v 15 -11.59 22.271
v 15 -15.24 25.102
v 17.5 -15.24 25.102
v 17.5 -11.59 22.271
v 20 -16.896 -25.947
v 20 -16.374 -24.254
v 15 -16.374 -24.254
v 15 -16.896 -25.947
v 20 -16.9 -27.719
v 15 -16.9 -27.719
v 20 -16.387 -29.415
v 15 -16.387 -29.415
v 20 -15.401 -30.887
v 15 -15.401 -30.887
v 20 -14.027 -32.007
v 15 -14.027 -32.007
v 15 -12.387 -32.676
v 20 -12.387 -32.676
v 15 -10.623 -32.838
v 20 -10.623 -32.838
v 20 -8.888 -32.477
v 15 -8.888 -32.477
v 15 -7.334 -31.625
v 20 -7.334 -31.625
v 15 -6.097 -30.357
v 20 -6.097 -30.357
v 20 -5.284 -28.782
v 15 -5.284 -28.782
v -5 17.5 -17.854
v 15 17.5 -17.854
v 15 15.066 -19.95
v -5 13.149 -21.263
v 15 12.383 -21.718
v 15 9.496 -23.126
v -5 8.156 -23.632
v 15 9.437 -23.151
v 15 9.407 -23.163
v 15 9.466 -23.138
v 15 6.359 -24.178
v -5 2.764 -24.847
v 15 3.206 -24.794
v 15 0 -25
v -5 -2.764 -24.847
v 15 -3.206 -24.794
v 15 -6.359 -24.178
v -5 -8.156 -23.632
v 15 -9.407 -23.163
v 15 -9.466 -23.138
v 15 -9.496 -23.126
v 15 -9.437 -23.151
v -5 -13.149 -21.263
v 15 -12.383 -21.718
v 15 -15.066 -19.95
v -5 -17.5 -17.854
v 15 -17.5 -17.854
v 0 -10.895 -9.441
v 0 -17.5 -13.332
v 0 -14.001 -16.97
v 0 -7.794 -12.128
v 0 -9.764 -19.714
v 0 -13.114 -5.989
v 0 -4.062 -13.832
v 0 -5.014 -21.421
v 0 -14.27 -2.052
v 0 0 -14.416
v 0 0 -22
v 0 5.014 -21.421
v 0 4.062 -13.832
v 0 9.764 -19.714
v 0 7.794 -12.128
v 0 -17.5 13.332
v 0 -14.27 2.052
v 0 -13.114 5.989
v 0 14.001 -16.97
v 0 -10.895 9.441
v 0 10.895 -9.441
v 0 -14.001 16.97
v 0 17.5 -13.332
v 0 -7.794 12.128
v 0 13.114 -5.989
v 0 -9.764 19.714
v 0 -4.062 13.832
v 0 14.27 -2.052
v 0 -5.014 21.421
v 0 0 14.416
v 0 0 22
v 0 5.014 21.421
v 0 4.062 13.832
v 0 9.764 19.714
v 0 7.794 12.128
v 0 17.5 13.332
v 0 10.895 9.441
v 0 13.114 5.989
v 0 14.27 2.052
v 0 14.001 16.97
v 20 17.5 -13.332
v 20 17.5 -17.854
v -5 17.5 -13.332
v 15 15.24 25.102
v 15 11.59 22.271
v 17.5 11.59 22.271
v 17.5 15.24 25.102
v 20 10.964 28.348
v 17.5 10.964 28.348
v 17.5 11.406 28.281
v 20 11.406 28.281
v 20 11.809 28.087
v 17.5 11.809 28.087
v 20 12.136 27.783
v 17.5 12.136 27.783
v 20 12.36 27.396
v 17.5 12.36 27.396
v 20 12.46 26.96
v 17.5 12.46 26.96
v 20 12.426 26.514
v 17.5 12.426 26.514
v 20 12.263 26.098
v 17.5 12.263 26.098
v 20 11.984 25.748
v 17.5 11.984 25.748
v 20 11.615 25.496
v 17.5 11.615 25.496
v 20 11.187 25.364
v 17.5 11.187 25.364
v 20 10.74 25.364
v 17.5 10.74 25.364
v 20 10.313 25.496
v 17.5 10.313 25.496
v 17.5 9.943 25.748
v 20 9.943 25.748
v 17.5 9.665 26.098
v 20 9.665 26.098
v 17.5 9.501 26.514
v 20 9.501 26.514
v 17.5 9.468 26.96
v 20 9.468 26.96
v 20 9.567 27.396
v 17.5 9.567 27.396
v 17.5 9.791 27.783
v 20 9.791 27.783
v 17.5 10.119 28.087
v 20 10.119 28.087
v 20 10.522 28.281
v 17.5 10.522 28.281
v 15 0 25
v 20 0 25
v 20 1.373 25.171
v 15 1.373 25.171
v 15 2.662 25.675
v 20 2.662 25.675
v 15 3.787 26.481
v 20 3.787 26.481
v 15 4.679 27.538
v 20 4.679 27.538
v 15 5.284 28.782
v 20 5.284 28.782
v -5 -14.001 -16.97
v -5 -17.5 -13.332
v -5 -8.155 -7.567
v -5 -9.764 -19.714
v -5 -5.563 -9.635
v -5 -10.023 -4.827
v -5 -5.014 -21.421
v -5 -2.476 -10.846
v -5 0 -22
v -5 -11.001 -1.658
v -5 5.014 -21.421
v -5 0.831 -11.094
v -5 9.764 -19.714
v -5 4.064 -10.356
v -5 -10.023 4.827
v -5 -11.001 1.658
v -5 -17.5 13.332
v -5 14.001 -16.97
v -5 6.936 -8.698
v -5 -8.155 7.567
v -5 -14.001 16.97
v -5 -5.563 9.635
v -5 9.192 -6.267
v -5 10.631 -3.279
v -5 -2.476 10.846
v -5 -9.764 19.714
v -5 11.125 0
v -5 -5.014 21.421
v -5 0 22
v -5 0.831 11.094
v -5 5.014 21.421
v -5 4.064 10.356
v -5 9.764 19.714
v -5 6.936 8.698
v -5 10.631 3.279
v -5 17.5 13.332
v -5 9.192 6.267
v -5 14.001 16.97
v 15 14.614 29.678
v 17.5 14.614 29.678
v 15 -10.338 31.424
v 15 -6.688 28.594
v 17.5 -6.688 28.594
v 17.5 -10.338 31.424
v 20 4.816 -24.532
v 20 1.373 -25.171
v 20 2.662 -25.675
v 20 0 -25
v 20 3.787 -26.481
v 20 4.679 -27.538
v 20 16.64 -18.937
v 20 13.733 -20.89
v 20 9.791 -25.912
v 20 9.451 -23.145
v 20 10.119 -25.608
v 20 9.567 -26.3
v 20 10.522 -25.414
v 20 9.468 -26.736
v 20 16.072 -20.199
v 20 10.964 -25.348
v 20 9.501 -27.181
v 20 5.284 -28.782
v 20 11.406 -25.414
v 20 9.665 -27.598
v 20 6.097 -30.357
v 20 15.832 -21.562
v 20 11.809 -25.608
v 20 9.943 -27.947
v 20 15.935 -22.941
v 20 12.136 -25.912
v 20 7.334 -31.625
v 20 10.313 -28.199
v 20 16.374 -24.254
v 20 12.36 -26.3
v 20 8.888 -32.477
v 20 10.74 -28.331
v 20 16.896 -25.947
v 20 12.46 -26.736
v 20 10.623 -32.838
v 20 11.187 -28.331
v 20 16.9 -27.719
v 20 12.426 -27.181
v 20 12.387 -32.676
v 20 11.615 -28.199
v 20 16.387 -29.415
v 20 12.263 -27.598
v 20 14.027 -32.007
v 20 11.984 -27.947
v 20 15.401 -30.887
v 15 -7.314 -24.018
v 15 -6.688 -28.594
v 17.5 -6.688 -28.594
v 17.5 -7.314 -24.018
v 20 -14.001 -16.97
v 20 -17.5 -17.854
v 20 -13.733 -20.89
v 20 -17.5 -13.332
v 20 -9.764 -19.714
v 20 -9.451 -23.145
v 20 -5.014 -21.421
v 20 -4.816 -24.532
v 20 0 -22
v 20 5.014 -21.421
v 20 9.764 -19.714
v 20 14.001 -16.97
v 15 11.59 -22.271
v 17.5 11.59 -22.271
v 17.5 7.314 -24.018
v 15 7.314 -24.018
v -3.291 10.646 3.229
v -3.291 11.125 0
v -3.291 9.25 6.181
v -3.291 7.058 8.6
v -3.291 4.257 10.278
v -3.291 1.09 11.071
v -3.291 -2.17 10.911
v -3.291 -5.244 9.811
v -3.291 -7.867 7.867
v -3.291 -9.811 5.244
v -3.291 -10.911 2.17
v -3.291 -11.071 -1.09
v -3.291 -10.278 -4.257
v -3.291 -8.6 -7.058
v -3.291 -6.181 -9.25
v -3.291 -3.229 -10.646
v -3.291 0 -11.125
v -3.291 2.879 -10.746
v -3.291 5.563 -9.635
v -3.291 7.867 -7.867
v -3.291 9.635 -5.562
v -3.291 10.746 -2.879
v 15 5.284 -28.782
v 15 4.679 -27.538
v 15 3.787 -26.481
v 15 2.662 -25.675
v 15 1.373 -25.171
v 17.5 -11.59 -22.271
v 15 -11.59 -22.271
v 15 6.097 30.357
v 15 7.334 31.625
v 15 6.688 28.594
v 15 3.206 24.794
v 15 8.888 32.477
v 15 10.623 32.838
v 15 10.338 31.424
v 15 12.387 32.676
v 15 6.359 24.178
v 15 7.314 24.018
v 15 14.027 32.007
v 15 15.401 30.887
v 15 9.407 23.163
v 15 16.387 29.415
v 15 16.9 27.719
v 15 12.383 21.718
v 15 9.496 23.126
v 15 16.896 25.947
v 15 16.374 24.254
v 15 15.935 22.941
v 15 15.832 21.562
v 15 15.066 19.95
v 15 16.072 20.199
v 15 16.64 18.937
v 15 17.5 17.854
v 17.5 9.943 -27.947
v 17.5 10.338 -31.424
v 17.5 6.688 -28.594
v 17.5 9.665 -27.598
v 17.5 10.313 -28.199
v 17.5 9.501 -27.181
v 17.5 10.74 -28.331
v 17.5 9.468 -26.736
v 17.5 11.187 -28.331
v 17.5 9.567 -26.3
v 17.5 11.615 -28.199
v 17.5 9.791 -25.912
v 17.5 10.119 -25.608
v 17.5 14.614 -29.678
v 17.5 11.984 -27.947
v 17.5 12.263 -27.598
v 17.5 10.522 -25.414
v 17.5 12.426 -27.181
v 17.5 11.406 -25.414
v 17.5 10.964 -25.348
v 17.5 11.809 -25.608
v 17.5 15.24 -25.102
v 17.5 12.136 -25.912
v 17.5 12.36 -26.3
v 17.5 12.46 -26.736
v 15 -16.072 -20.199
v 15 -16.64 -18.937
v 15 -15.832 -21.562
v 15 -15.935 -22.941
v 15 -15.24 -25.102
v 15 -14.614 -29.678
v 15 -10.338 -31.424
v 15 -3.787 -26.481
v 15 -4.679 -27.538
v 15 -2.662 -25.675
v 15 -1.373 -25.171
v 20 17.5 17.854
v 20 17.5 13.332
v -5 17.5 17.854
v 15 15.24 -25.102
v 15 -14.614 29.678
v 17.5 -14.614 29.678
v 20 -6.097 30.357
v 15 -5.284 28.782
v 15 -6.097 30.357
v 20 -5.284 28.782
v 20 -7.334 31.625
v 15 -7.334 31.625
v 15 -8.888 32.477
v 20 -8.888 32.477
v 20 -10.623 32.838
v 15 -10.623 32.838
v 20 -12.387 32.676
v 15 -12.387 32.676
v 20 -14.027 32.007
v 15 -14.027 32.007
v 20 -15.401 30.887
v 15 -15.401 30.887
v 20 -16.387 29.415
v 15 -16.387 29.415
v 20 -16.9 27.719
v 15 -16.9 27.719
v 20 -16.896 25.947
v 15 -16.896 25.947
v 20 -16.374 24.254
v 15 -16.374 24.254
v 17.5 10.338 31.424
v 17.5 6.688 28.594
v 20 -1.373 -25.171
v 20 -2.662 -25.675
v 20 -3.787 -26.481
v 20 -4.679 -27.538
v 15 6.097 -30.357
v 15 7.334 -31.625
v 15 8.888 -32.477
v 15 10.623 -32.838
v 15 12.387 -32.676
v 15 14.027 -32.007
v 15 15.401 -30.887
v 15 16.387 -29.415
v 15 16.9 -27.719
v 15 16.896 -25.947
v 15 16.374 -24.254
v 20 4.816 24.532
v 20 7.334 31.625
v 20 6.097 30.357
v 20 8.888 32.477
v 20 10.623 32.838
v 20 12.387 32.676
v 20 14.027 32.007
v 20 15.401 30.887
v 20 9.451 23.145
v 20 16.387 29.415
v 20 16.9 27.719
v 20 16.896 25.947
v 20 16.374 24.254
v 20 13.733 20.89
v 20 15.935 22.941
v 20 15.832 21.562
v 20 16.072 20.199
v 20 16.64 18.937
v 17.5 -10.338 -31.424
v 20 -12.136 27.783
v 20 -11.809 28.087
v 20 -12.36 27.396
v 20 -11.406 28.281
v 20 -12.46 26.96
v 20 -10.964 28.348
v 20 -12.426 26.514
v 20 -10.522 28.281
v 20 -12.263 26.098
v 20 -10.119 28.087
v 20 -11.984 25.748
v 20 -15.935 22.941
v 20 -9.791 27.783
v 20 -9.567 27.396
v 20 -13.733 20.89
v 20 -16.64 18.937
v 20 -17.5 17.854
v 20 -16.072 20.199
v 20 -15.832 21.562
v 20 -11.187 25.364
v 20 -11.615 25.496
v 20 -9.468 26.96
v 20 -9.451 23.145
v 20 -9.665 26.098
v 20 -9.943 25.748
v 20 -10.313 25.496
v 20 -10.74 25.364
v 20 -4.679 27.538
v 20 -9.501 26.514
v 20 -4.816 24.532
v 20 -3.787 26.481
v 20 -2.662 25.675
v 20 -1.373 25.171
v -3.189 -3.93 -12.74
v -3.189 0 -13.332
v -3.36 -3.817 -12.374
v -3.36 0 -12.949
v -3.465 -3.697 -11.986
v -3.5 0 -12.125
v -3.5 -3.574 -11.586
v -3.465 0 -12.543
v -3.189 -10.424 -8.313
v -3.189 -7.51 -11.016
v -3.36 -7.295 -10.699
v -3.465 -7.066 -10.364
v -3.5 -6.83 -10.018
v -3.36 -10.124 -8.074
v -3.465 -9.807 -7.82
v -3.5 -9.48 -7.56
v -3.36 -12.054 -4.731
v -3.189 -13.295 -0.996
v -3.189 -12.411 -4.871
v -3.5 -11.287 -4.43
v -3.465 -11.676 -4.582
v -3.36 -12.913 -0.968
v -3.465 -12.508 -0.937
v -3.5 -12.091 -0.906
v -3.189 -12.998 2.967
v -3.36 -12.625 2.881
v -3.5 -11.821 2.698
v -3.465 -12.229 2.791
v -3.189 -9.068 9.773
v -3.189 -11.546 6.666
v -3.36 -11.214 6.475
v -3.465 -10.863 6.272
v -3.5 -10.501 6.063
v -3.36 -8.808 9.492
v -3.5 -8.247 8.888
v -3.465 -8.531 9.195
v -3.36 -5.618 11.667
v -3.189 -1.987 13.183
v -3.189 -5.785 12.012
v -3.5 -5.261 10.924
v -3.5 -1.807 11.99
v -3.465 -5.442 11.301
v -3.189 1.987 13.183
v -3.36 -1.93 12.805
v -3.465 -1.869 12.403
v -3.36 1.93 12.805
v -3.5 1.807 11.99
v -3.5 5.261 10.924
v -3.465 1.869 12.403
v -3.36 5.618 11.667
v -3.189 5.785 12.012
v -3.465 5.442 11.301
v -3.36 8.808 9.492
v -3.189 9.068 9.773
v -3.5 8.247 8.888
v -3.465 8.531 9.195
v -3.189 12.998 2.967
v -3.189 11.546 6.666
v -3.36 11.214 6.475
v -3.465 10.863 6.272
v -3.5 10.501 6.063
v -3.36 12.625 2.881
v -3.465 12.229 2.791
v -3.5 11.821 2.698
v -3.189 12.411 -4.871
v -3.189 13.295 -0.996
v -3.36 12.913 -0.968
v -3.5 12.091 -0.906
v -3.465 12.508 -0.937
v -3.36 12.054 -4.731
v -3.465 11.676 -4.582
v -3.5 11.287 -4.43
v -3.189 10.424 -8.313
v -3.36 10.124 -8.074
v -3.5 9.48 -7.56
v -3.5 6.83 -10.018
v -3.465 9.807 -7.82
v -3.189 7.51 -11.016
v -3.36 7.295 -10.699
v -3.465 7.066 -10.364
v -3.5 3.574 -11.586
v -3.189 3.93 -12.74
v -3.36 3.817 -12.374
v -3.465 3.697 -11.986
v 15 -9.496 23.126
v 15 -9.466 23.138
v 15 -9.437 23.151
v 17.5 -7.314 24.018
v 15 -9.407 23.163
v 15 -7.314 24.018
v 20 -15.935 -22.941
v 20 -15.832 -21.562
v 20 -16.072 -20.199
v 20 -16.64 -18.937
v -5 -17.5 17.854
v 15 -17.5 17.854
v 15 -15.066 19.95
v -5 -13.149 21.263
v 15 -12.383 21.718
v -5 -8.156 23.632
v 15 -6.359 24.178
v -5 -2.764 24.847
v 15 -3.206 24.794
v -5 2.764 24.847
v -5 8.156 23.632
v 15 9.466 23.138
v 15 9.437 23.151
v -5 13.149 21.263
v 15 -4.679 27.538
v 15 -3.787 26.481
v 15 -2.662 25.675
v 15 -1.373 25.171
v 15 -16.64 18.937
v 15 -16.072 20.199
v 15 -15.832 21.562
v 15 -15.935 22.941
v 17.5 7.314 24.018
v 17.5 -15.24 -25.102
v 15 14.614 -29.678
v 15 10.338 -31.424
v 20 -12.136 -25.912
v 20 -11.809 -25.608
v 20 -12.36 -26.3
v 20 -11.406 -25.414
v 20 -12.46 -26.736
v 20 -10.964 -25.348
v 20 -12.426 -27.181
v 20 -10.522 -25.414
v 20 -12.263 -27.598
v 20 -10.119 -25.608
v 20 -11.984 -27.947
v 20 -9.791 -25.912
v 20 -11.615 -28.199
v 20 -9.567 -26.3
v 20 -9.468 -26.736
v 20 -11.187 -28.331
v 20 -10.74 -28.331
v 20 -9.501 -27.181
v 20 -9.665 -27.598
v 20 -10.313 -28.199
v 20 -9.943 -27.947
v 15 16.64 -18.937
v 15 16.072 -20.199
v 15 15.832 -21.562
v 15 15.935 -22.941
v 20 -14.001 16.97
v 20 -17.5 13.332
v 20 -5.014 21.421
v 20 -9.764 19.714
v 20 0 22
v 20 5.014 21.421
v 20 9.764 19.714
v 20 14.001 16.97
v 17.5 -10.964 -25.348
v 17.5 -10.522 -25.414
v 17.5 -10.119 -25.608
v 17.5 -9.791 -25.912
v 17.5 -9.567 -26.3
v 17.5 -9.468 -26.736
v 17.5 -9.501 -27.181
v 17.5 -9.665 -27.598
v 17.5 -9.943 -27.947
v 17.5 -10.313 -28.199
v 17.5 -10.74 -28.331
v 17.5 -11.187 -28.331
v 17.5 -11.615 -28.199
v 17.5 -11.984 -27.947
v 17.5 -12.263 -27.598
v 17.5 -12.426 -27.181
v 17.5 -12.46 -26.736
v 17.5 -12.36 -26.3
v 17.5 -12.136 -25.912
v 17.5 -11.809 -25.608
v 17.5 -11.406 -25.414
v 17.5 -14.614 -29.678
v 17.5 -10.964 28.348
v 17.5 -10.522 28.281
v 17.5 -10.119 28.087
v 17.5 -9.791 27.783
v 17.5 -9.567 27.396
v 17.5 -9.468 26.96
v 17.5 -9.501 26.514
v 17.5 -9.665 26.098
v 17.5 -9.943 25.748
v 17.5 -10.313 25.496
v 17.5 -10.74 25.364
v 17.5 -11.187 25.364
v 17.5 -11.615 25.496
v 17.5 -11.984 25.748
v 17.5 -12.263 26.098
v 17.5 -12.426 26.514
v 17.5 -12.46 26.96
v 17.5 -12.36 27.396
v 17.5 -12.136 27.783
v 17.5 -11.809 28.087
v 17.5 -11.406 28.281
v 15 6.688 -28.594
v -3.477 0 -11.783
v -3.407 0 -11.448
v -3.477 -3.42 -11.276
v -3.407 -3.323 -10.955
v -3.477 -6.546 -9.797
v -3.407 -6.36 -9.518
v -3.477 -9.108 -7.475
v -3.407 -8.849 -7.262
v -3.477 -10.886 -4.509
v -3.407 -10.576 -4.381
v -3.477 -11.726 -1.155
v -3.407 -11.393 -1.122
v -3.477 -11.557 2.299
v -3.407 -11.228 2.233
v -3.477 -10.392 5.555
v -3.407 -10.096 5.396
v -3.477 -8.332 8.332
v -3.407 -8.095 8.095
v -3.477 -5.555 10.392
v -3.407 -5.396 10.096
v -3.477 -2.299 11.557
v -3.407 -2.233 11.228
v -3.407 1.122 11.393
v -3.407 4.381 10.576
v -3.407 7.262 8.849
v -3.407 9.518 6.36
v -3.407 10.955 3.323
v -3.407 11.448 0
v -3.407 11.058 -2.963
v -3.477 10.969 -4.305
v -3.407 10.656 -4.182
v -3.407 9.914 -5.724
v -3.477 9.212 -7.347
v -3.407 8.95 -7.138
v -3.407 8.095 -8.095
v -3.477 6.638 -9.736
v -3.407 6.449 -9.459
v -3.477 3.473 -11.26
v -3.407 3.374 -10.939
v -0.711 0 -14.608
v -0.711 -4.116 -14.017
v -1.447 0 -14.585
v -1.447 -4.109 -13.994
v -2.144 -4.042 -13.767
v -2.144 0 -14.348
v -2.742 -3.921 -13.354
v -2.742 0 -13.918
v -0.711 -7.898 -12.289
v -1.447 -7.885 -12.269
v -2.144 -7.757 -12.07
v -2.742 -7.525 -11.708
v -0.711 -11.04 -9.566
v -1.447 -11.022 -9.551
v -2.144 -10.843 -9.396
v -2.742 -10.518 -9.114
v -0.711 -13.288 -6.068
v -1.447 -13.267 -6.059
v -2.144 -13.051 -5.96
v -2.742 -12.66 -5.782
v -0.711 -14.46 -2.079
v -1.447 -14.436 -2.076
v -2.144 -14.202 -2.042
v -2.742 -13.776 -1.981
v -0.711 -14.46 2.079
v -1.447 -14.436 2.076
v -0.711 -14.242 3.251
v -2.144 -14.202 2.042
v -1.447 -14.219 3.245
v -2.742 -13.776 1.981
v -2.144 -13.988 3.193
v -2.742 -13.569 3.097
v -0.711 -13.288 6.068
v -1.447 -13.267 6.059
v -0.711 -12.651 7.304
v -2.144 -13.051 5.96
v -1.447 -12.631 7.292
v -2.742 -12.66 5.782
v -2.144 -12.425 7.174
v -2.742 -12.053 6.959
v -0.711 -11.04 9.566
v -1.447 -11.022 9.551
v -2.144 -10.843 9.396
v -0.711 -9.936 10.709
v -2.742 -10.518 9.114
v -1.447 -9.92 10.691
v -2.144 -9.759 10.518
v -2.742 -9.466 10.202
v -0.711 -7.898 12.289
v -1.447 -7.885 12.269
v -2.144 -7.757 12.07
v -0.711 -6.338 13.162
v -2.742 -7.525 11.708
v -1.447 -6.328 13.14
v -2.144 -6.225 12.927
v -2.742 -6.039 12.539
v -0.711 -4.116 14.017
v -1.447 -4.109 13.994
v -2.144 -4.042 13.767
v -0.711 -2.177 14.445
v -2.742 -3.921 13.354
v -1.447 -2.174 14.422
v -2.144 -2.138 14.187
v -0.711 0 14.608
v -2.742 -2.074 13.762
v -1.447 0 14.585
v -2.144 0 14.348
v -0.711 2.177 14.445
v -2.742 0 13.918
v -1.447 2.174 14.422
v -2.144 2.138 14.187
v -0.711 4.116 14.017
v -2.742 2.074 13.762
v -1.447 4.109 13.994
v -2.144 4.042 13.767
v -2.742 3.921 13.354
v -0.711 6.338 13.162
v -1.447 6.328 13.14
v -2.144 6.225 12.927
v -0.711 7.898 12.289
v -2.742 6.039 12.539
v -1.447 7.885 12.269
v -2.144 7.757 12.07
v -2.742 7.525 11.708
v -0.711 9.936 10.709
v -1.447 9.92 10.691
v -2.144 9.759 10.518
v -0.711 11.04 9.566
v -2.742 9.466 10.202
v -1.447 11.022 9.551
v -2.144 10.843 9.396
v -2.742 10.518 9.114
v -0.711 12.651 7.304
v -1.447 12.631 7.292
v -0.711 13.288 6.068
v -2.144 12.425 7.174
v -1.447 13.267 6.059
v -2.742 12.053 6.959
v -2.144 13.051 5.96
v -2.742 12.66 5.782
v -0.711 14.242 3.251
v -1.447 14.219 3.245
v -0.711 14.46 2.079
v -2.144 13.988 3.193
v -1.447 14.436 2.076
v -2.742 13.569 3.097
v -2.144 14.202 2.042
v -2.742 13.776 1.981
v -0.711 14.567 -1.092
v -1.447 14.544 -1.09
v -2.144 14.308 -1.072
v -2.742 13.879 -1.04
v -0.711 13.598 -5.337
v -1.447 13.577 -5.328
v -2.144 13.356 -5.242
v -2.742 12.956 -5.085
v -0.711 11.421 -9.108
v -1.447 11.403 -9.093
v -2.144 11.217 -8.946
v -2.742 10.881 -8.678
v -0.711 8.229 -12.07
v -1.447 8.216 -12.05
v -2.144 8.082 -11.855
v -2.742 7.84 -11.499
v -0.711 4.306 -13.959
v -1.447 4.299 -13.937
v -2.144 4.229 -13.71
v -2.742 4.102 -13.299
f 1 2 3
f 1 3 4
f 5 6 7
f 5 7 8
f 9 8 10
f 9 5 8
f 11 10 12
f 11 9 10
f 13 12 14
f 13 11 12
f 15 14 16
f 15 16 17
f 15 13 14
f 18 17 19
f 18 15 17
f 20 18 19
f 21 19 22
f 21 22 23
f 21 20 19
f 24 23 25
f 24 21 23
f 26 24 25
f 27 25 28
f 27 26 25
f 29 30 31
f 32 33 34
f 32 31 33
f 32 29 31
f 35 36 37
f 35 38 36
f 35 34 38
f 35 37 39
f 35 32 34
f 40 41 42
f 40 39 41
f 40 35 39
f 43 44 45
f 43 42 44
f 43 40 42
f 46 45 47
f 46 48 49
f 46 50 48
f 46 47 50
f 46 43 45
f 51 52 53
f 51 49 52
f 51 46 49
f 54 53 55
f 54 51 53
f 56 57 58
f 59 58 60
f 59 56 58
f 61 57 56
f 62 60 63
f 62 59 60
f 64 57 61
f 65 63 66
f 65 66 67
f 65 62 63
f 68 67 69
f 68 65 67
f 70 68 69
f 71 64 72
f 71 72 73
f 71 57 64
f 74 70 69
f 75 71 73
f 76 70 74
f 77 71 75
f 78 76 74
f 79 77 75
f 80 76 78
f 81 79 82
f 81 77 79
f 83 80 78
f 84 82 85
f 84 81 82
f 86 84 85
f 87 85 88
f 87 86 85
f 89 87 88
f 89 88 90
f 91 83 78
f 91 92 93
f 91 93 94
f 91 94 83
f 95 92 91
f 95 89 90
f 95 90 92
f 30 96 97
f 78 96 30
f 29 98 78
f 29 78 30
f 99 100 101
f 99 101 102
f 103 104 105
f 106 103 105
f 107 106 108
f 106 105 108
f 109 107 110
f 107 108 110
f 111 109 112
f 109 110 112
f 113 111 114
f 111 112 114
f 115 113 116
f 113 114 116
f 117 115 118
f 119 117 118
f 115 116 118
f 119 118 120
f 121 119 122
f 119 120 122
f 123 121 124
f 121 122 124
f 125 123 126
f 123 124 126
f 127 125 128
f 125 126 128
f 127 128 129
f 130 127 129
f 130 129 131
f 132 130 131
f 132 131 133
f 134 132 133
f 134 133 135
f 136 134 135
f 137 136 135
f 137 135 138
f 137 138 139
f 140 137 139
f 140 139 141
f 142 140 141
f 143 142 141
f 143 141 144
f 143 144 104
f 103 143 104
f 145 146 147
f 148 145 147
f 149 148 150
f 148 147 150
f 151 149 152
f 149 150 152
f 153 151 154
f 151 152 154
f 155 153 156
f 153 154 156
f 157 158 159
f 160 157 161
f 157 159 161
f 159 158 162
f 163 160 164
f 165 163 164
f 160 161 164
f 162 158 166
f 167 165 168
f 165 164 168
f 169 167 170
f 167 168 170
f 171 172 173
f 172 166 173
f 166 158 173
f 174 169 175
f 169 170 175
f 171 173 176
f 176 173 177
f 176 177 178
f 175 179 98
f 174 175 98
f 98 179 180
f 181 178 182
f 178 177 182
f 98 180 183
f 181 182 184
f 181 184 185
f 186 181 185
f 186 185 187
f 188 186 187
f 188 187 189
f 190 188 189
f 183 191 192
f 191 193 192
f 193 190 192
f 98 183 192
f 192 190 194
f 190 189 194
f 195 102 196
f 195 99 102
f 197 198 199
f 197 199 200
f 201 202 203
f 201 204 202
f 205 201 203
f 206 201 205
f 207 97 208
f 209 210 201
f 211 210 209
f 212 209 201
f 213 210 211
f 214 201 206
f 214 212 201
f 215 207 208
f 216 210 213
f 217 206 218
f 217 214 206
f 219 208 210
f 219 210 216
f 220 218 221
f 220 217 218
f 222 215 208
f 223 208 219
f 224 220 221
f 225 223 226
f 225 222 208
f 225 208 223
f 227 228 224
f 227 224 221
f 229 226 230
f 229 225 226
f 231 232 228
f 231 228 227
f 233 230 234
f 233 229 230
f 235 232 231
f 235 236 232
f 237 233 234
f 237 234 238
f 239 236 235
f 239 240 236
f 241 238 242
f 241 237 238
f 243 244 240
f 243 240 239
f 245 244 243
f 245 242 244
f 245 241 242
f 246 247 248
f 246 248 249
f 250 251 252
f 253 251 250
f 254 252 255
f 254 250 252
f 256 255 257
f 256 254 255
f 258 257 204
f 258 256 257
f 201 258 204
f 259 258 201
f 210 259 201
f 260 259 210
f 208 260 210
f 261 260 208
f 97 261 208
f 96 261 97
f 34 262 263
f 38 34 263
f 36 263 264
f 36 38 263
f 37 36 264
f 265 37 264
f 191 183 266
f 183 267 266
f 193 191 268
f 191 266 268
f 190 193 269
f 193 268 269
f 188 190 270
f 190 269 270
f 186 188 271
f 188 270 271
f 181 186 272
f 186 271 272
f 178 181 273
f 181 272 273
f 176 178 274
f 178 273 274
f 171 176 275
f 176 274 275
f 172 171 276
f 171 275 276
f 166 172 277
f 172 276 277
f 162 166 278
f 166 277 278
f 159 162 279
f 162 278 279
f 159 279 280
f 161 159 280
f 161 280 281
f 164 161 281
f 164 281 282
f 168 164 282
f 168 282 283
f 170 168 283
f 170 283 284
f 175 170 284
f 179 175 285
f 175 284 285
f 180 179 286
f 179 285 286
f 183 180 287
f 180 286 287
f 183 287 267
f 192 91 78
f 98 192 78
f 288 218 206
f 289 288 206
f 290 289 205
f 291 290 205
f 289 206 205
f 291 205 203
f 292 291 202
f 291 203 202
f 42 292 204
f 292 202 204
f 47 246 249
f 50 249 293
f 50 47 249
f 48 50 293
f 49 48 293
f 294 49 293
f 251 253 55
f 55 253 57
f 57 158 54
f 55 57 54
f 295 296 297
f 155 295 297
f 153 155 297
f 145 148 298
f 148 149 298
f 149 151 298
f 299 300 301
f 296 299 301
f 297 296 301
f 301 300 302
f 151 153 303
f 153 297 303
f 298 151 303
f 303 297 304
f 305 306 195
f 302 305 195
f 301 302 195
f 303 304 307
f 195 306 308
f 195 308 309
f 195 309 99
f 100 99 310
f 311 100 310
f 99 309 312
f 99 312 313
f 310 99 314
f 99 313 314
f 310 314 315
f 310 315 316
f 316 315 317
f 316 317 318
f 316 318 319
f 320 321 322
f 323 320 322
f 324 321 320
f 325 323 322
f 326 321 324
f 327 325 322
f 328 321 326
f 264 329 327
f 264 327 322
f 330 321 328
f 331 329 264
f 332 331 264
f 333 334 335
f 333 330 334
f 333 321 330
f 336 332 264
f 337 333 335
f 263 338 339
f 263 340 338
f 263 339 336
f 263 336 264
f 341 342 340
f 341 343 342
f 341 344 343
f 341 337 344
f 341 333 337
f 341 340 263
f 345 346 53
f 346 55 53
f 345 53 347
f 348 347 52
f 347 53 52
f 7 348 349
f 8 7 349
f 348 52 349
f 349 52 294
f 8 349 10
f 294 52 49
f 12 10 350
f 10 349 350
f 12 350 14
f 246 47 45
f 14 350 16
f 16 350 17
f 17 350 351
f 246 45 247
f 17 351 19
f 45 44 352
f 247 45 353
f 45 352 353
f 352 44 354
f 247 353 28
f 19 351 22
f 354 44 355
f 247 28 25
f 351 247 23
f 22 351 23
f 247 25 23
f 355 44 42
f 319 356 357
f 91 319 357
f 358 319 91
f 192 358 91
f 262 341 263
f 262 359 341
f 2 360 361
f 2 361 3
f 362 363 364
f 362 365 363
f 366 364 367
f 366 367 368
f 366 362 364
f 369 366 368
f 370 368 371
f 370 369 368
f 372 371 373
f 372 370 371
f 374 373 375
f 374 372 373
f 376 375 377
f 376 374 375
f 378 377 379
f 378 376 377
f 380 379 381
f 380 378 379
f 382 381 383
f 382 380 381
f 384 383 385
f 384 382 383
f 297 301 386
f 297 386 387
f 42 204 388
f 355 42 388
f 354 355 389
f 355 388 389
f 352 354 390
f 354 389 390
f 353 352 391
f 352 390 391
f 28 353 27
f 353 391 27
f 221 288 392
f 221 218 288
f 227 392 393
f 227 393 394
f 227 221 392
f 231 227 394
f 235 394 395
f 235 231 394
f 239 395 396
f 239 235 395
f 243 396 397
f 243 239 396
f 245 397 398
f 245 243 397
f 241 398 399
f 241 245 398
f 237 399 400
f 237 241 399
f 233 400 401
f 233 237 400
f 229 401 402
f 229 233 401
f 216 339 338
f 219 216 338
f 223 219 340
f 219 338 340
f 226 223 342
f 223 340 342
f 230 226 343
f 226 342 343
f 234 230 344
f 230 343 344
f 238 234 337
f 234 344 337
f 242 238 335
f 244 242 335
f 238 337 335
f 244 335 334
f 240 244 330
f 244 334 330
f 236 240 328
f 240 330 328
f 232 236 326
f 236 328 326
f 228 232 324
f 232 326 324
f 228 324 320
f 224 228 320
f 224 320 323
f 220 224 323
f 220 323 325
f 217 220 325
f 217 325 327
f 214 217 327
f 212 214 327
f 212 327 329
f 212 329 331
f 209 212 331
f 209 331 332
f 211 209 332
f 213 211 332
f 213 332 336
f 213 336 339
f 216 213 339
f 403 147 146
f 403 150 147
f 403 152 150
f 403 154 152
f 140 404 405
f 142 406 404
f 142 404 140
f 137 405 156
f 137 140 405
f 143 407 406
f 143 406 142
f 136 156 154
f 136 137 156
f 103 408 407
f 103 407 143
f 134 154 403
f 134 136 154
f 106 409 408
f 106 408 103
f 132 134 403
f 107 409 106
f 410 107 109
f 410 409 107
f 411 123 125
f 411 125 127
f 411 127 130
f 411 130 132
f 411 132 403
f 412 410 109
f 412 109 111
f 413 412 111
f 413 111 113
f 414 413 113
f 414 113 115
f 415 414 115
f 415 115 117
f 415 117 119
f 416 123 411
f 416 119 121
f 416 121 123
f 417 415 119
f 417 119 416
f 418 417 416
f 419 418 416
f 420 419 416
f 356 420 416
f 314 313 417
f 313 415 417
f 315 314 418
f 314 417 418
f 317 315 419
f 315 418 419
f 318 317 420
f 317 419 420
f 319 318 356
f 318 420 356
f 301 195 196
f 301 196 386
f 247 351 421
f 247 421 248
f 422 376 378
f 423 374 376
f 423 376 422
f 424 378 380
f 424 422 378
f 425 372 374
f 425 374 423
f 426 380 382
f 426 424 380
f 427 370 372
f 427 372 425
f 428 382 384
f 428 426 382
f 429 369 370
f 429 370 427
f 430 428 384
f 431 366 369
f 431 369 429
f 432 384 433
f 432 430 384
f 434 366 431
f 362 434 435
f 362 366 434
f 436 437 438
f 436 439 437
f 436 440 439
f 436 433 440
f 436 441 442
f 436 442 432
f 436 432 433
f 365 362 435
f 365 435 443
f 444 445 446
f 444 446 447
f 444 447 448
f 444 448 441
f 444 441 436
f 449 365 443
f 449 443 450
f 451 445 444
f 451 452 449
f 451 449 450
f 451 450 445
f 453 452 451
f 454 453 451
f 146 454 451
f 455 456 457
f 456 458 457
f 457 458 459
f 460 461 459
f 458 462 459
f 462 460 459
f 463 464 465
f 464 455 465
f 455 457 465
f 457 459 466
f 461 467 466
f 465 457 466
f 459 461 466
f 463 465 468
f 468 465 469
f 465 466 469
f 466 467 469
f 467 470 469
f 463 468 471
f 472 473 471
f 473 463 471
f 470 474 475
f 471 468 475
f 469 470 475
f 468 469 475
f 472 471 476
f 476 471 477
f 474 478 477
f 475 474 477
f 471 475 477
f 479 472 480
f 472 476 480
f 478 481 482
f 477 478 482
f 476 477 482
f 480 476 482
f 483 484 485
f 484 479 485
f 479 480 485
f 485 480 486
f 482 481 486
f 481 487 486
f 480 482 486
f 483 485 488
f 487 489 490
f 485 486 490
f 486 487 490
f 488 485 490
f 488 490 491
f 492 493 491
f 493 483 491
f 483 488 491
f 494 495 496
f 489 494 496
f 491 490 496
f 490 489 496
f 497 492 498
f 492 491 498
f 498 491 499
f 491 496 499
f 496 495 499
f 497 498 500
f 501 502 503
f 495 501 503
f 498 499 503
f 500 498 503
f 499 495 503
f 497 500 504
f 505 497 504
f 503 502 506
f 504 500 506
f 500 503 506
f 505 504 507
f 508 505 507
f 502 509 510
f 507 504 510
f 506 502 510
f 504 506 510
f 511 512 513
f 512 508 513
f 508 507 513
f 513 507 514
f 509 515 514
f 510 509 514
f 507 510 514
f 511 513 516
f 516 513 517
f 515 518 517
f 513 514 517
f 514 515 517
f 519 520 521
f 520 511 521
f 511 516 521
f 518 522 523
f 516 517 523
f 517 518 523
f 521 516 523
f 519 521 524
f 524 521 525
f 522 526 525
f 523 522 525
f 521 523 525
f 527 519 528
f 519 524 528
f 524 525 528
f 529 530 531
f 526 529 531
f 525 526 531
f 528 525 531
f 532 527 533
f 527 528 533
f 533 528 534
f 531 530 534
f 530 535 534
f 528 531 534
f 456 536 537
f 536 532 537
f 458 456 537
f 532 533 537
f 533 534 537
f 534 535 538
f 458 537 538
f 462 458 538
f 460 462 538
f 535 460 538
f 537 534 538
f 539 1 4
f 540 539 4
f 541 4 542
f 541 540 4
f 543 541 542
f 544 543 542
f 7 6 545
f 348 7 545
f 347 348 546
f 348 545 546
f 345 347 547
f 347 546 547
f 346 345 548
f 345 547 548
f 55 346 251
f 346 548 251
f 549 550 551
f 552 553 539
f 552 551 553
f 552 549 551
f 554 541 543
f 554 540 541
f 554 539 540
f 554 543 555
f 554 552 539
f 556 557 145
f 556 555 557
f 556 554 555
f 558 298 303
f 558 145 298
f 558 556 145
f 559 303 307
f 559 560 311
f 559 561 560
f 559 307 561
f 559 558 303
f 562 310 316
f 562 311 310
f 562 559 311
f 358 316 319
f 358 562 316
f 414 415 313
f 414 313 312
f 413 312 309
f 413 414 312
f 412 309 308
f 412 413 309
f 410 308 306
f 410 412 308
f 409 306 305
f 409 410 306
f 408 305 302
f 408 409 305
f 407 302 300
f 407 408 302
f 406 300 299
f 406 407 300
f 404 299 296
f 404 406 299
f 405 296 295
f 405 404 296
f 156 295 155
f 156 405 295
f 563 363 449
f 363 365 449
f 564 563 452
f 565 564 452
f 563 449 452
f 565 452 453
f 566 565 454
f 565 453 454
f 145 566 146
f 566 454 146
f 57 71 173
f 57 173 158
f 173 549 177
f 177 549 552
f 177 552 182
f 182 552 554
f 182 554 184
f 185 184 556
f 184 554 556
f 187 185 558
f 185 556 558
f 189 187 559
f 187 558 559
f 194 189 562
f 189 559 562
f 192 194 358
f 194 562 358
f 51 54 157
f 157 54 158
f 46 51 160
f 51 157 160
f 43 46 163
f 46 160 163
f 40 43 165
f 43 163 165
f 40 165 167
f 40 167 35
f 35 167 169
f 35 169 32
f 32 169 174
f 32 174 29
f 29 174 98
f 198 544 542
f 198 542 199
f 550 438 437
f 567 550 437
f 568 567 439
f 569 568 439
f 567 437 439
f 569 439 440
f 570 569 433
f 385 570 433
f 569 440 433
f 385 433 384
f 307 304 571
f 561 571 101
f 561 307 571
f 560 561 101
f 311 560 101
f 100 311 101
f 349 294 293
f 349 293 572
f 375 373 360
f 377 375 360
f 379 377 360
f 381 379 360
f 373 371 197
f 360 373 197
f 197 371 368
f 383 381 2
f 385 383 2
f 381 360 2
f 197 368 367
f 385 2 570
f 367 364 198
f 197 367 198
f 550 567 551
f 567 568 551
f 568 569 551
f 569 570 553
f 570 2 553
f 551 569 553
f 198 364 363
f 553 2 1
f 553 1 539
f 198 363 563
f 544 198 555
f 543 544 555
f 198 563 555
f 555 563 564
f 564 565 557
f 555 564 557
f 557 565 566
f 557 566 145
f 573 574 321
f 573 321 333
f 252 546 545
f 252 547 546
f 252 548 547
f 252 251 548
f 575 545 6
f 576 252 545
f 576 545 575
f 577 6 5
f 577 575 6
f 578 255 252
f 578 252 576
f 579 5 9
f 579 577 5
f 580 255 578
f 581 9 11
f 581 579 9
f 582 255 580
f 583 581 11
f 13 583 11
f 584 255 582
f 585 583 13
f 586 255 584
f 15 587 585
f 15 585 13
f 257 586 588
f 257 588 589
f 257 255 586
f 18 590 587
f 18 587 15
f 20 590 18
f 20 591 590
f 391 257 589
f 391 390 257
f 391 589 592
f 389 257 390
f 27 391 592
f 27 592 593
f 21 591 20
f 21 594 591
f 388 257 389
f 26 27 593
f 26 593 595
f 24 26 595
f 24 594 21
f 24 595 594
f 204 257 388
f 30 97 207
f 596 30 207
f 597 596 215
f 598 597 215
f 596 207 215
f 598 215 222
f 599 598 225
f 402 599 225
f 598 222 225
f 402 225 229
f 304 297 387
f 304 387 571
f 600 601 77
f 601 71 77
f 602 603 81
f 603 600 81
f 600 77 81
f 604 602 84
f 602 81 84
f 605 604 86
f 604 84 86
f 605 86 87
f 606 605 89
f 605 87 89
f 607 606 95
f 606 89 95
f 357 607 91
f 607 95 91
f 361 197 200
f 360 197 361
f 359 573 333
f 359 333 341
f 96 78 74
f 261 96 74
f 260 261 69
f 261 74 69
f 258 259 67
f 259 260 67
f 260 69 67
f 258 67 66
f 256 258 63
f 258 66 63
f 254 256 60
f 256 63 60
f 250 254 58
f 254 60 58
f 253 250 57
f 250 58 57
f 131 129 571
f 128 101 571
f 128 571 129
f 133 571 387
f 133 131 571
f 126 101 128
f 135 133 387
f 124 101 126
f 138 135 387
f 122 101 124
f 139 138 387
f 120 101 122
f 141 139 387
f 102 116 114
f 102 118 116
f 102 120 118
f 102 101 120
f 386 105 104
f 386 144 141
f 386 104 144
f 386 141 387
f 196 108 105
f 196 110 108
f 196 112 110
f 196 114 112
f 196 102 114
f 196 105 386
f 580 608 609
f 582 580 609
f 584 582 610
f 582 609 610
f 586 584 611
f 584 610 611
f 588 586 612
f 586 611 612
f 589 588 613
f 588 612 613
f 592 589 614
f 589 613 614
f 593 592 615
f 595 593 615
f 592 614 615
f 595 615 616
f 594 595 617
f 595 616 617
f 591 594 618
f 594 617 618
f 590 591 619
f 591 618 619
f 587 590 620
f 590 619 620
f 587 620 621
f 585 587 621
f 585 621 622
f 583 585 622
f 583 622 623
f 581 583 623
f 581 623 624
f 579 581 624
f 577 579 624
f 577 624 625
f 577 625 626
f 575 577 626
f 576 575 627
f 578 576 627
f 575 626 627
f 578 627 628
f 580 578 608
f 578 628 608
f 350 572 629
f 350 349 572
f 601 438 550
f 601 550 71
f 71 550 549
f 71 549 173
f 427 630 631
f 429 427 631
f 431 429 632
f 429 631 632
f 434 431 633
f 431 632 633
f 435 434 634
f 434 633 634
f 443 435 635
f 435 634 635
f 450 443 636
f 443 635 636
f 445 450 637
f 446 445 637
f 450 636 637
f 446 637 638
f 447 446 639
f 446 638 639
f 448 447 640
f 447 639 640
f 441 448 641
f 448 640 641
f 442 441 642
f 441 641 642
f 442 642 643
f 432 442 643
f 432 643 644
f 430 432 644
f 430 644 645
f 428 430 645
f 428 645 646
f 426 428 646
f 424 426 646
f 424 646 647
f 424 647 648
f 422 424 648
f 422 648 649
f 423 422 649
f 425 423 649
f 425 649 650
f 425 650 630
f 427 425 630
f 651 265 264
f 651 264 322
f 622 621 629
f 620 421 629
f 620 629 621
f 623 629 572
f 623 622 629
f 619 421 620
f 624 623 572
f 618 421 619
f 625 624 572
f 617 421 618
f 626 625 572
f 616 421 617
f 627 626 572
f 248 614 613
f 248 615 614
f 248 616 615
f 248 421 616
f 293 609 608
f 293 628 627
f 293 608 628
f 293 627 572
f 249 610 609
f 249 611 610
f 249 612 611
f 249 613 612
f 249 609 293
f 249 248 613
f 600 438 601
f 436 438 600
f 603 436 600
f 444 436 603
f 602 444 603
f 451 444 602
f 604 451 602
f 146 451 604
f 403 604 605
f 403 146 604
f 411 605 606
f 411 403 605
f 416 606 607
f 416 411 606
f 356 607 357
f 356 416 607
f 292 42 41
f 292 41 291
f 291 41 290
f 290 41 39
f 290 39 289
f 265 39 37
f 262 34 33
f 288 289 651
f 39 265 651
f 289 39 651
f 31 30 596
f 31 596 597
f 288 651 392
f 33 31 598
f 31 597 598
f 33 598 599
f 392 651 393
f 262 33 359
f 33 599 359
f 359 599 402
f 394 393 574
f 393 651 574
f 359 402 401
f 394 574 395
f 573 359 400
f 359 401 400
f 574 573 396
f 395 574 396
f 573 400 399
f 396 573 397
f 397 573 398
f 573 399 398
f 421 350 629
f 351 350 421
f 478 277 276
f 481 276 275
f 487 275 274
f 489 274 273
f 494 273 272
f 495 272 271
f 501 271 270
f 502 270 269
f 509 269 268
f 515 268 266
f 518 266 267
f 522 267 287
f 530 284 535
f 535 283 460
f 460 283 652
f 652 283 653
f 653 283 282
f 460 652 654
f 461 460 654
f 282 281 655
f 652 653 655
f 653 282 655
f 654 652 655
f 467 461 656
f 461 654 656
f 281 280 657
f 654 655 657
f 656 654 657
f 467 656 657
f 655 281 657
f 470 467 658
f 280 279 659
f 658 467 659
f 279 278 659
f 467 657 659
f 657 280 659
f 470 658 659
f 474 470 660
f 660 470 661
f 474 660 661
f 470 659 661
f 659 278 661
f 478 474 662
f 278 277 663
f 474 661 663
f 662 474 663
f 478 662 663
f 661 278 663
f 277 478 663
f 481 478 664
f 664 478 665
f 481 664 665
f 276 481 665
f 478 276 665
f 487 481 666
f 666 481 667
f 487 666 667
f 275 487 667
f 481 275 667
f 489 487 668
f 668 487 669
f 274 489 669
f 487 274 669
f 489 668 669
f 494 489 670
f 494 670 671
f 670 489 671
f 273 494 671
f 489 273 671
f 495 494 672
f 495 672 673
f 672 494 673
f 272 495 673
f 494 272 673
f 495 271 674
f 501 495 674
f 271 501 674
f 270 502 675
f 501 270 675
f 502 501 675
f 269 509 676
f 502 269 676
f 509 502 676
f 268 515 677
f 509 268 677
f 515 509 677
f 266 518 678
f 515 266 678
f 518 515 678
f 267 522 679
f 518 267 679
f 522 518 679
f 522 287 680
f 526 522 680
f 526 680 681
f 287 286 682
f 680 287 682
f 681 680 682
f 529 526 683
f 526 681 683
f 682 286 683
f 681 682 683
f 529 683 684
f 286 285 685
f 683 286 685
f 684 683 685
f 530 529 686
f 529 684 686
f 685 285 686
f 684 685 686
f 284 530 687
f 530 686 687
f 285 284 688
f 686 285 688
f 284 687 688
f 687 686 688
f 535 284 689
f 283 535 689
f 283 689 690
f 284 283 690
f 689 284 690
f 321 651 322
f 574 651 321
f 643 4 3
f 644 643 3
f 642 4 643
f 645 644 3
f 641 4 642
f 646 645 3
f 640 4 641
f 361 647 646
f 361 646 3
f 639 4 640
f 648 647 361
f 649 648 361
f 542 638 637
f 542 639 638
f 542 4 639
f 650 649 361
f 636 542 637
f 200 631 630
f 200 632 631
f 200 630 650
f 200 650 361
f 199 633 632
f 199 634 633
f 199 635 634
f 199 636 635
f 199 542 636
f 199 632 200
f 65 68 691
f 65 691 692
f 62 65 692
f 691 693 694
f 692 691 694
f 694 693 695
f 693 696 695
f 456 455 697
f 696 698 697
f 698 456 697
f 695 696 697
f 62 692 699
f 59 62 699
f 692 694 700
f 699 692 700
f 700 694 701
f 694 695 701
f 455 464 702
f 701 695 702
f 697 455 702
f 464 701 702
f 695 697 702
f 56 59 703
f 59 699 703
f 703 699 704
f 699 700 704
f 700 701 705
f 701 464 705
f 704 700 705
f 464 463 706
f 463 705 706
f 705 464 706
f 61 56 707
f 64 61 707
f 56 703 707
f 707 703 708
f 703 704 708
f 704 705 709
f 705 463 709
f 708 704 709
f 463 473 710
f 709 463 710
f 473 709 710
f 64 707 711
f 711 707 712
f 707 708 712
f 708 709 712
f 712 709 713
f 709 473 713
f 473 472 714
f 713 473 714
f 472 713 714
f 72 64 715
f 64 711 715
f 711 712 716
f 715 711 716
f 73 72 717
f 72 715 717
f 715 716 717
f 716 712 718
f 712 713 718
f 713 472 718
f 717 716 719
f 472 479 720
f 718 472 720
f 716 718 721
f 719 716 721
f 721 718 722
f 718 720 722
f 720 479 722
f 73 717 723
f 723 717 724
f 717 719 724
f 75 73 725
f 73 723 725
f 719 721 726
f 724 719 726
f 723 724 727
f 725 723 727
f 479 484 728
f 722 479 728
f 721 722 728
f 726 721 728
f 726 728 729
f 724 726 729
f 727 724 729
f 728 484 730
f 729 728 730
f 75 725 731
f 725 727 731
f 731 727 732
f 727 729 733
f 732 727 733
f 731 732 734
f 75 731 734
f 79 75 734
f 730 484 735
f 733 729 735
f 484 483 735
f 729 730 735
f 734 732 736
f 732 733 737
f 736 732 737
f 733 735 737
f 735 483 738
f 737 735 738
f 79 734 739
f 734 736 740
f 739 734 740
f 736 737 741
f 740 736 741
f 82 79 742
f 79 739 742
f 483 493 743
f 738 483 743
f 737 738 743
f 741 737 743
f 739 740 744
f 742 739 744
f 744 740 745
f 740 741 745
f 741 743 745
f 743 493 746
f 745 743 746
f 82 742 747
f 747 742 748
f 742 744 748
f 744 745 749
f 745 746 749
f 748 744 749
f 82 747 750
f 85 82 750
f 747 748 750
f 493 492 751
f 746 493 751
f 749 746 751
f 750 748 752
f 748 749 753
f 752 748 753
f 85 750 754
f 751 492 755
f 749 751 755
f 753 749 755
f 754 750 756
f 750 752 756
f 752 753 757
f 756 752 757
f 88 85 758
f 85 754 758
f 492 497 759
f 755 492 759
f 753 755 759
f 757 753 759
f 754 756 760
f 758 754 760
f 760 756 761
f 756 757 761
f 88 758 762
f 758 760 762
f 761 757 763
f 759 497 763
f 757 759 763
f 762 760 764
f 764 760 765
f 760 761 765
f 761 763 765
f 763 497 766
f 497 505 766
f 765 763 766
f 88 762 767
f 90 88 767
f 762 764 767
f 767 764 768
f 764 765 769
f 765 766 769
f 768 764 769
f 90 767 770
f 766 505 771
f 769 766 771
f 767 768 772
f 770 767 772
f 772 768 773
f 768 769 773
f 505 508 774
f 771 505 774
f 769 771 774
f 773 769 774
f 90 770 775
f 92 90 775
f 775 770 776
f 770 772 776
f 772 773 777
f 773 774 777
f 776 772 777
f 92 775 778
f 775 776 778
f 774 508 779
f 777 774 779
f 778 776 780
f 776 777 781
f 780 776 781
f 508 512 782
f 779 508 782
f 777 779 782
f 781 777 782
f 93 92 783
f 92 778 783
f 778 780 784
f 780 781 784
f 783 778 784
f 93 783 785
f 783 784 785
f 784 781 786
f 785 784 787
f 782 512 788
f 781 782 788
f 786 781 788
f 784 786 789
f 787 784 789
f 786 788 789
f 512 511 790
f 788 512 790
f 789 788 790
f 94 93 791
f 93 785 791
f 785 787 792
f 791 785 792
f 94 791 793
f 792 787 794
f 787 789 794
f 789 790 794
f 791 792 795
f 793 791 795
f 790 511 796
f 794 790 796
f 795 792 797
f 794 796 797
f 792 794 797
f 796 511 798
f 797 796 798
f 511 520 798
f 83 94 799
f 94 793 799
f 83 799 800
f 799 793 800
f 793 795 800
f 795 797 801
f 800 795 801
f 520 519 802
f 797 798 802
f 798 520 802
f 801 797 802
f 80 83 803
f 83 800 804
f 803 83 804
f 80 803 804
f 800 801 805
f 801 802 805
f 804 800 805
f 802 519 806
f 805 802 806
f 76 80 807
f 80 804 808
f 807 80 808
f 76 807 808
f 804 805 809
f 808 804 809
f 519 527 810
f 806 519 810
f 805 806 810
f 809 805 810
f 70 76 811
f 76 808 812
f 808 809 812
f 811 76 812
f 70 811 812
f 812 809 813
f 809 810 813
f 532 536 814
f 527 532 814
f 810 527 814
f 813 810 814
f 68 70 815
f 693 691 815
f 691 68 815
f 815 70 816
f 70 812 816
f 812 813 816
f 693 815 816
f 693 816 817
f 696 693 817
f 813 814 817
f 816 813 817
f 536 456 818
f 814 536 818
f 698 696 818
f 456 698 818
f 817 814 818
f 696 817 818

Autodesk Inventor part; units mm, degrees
ref_plane "YZ Plane" through (0, 0, 0) normal (1, 0, 0) x (0, 1, 0)
ref_plane "XZ Plane" through (0, 0, 0) normal (0, 1, 0) x (-1, 0, 0)
ref_plane "XY Plane" through (0, 0, 0) normal (0, 0, 1) x (1, 0, 0)
sketch "Sketch1" plane through (0, 0, 0) normal (1, 0, 0) x (0, 1, 0)
  circle A0 centre (0, 0) radius 11.125
  line L0 (17.5, 17.8536) -> (17.5, -17.8536)
  line L1 (-17.5, 17.8536) -> (-17.5, -17.8536)
  circle A1 centre (0, 0) radius 25
  circle A2 centre (0, 0) radius 22
  point P0 (-17.5, -13.3323)
  point P1 (17.5, -13.3323)
  point P2 (17.5, 13.3323)
  point P3 (-17.5, 13.3323)
  dimension "d0" = 22.25
  dimension "d1" = 44
  dimension "d2" = 3
  dimension "d3" = 35
  dimension "d4" = 17.5
  dimension "d5" = 17.5
extrude "Extrusion1" add sketch "Sketch1" against normal blind 5 contours L0 A2 L1
sketch "Sketch2" plane through (0, 0, 0) normal (0, 1, 0) x (-1, 0, 0)
  circle A0 centre (1, -12.125) radius 2.5
  line L0 (0, -11.125) -> (0, 11.125) projected
  line L1 (0, -13.3323) -> (5, -13.3323) projected
  line L2 (10.1054, 0) -> (-6.8503, 0) construction
  point P0 (0, 0)
  dimension "d8" = 5
  dimension "d9" = 1
  dimension "d11" = 1
revolve "Revolution1" cut sketch "Sketch2" angle 360 about axis through (-10.1054, 0, 0) along (1, 0, 0)
extrude "Extrusion2" add sketch "Sketch1" along normal blind 20 and the other way blind 5 contours L0 A2 L1 A1 | L0 A1 L1 A2
sketch "Sketch3" plane through (20, 0, 0) normal (1, 0, 0) x (0, 0, -1)
  line L0 (-13.3323, 17.5) -> (-17.8536, 17.5) projected
  arc A0 (-24.2536, 16.374) -> (-17.8536, 17.5) centre (-21.8402, 21.4076) ccw
  arc A1 (-24.2536, 16.374) -> (-28.7823, 5.2842) centre (-26.8477, 10.9637) ccw
  arc A2 (-17.8536, 17.5) -> (-17.8536, -17.5) centre (0, 0) ccw projected
  arc A3 (-25, 0) -> (-28.7823, 5.2842) centre (-30.5823, 0) ccw
  arc A4 (-28.7823, -5.2842) -> (-25, 0) centre (-30.5823, 0) ccw
  arc A5 (-28.7823, -5.2842) -> (-24.2536, -16.374) centre (-26.8477, -10.9637) ccw
  arc A6 (-17.8536, -17.5) -> (-24.2536, -16.374) centre (-21.8402, -21.4076) ccw
  arc A7 (-17.8536, 17.5) -> (-17.8536, -17.5) centre (0, 0) ccw projected
  line L1 (-17.8536, 17.5) -> (17.8536, 17.5) projected
  arc A8 (17.8536, 17.5) -> (24.2536, 16.374) centre (21.8402, 21.4076) ccw
  arc A9 (28.7823, 5.2842) -> (24.2536, 16.374) centre (26.8477, 10.9637) ccw
  arc A10 (28.7823, 5.2842) -> (25, 0) centre (30.5823, 0) ccw
  line L2 (17.8536, -17.5) -> (-17.8536, -17.5) projected
  arc A11 (24.2536, -16.374) -> (17.8536, -17.5) centre (21.8402, -21.4076) ccw
  arc A12 (24.2536, -16.374) -> (28.7823, -5.2842) centre (26.8477, -10.9637) ccw
  arc A13 (25, 0) -> (28.7823, -5.2842) centre (30.5823, 0) ccw
  arc A14 (17.8536, -17.5) -> (17.8536, 17.5) centre (0, 0) ccw projected
  circle A15 centre (-26.8477, -10.9637) radius 4 construction
  circle A16 centre (-26.8477, 10.9637) radius 4 construction
  circle A17 centre (26.8477, 10.9637) radius 4 construction
  circle A18 centre (26.8477, -10.9637) radius 4 construction
  dimension "d17" = 6
  dimension "d18" = 6
  dimension "d19" = 6
  dimension "d20" = 6
  dimension "d21" = 8
  dimension "d22" = 8
  dimension "d23" = 8
  dimension "d24" = 8
extrude "Extrusion3" add sketch "Sketch3" against normal blind 5 contours A2 A3 A1 A0 | A8 A9 A10 A14 | A2 A6 A5 A4 | A13 A12 A11 A14
sketch "Sketch4" plane through (15, 0, 0) normal (-1, 0, 0) x (0, 0, 1)
  line L0 (22.2714, -11.5895) -> (24.0176, -7.3135)
  line L1 (24.0176, -7.3135) -> (28.5938, -6.6877)
  line L2 (28.5938, -6.6877) -> (31.4239, -10.3379)
  line L3 (31.4239, -10.3379) -> (29.6777, -14.6139)
  line L4 (29.6777, -14.6139) -> (25.1015, -15.2397)
  line L5 (25.1015, -15.2397) -> (22.2714, -11.5895)
  line L6 (25.1015, 15.2397) -> (29.6777, 14.6139)
  line L7 (29.6777, 14.6139) -> (31.4239, 10.3379)
  line L8 (31.4239, 10.3379) -> (28.5938, 6.6877)
  line L9 (28.5938, 6.6877) -> (24.0176, 7.3135)
  line L10 (24.0176, 7.3135) -> (22.2714, 11.5895)
  line L11 (22.2714, 11.5895) -> (25.1015, 15.2397)
  line L12 (-25.1015, -15.2397) -> (-29.6777, -14.6139)
  line L13 (-29.6777, -14.6139) -> (-31.4239, -10.3379)
  line L14 (-31.4239, -10.3379) -> (-28.5938, -6.6877)
  line L15 (-28.5938, -6.6877) -> (-24.0176, -7.3135)
  line L16 (-24.0176, -7.3135) -> (-22.2714, -11.5895)
  line L17 (-22.2714, -11.5895) -> (-25.1015, -15.2397)
  line L18 (-29.6777, 14.6139) -> (-25.1015, 15.2397)
  line L19 (-25.1015, 15.2397) -> (-22.2714, 11.5895)
  line L20 (-22.2714, 11.5895) -> (-24.0176, 7.3135)
  line L21 (-24.0176, 7.3135) -> (-28.5938, 6.6877)
  line L22 (-28.5938, 6.6877) -> (-31.4239, 10.3379)
  line L23 (-31.4239, 10.3379) -> (-29.6777, 14.6139)
  arc A0 (17.8536, -17.5) -> (17.8536, 17.5) centre (0, 0) ccw projected
  arc A1 (-17.8536, 17.5) -> (-17.8536, -17.5) centre (0, 0) ccw projected
  arc A2 (24.2536, -16.374) -> (17.8536, -17.5) centre (21.8402, -21.4076) ccw projected
  arc A3 (25, 0) -> (28.7823, -5.2842) centre (30.5823, 0) ccw projected
  arc A4 (28.7823, 5.2842) -> (25, 0) centre (30.5823, 0) ccw projected
  arc A5 (17.8536, 17.5) -> (24.2536, 16.374) centre (21.8402, 21.4076) ccw projected
  arc A6 (-17.8536, -17.5) -> (-24.2536, -16.374) centre (-21.8402, -21.4076) ccw projected
  arc A7 (-28.7823, -5.2842) -> (-25, 0) centre (-30.5823, 0) ccw projected
  arc A8 (-25, 0) -> (-28.7823, 5.2842) centre (-30.5823, 0) ccw projected
  arc A9 (-24.2536, 16.374) -> (-17.8536, 17.5) centre (-21.8402, 21.4076) ccw projected
  point P0 (26.8477, -10.9637)
  point P1 (26.8477, 10.9637)
  point P2 (-26.8477, -10.9637)
  point P3 (-26.8477, 10.9637)
  point P4 (23.1445, 9.4515)
  point P5 (23.1445, -9.4515)
  point P6 (-23.1445, -9.4515)
  point P7 (-23.1445, 9.4515)
  dimension "d27" = 8
  dimension "d30" = 8
  dimension "d31" = 8
  dimension "d32" = 8
  dimension "d33" = 11.5823
  dimension "d34" = 11.5823
  dimension "d35" = 11.5823
  dimension "d36" = 11.5823
  dimension "d37" = 11.5823
  dimension "d38" = 11.5823
  dimension "d39" = 11.5823
  dimension "d40" = 11.5823
extrude "Extrusion4" cut sketch "Sketch4" against normal blind 2.5
sketch "Sketch5" plane through (17.5, 0, 0) normal (-1, 0, 0) x (0, 0, 1)
  circle A0 centre (-26.8477, -10.9637) radius 1.5
  circle A1 centre (-26.8477, 10.9637) radius 1.5
  circle A2 centre (26.8477, 10.9637) radius 1.5
  circle A3 centre (26.8477, -10.9637) radius 1.5
  line L0 (29.6777, -14.6139) -> (25.1015, -15.2397) projected
  line L1 (24.0176, -7.3135) -> (28.5938, -6.6877) projected
  line L2 (31.4239, -10.3379) -> (29.6777, -14.6139) projected
  line L3 (23.1445, -9.4515) -> (24.0176, -7.3135) projected
  line L4 (28.5938, 6.6877) -> (24.0176, 7.3135) projected
  line L5 (25.1015, 15.2397) -> (29.6777, 14.6139) projected
  line L6 (23.1445, 9.4515) -> (22.2714, 11.5895) projected
  line L7 (29.6777, 14.6139) -> (31.4239, 10.3379) projected
  line L8 (-28.5938, 6.6877) -> (-31.4239, 10.3379) projected
  line L9 (-25.1015, 15.2397) -> (-22.2714, 11.5895) projected
  line L10 (-24.0176, 7.3135) -> (-28.5938, 6.6877) projected
  line L11 (-29.6777, 14.6139) -> (-25.1015, 15.2397) projected
  line L12 (-25.1015, -15.2397) -> (-29.6777, -14.6139) projected
  line L13 (-28.5938, -6.6877) -> (-24.0176, -7.3135) projected
  line L14 (-31.4239, -10.3379) -> (-28.5938, -6.6877) projected
  line L15 (-22.2714, -11.5895) -> (-25.1015, -15.2397) projected
  point P0 (0, 0)
  dimension "d43" = 4
  dimension "d44" = 4
  dimension "d45" = 4
  dimension "d46" = 4
  dimension "d47" = 3
  dimension "d48" = 3
  dimension "d49" = 4
  dimension "d50" = 4
  dimension "d51" = 4
  dimension "d52" = 4
  dimension "d53" = 3
  dimension "d54" = 3
  dimension "d55" = 4
  dimension "d56" = 4
  dimension "d57" = 4
  dimension "d58" = 4
  dimension "d59" = 4
  dimension "d60" = 4
  dimension "d61" = 4
  dimension "d62" = 4
extrude "Extrusion5" cut sketch "Sketch5" against normal through all
equation "\"d4\" = d5"
equation "\"d18\" = d17"
equation "\"d19\" = d17"
equation "\"d20\" = d17"
equation "\"d22\" = d21"
equation "\"d23\" = d21"
equation "\"d24\" = d21"
equation "\"d33\" = d34"
equation "\"d35\" = d36"
equation "\"d37\" = d38"
equation "\"d39\" = d40"
equation "\"d43\" = d44"
equation "\"d45\" = d46"
equation "\"d49\" = d50"
equation "\"d51\" = d52"
equation "\"d55\" = d56"
equation "\"d57\" = d58"
equation "\"d59\" = d60"
equation "\"d61\" = d62"
properties part number "shaft holder"
